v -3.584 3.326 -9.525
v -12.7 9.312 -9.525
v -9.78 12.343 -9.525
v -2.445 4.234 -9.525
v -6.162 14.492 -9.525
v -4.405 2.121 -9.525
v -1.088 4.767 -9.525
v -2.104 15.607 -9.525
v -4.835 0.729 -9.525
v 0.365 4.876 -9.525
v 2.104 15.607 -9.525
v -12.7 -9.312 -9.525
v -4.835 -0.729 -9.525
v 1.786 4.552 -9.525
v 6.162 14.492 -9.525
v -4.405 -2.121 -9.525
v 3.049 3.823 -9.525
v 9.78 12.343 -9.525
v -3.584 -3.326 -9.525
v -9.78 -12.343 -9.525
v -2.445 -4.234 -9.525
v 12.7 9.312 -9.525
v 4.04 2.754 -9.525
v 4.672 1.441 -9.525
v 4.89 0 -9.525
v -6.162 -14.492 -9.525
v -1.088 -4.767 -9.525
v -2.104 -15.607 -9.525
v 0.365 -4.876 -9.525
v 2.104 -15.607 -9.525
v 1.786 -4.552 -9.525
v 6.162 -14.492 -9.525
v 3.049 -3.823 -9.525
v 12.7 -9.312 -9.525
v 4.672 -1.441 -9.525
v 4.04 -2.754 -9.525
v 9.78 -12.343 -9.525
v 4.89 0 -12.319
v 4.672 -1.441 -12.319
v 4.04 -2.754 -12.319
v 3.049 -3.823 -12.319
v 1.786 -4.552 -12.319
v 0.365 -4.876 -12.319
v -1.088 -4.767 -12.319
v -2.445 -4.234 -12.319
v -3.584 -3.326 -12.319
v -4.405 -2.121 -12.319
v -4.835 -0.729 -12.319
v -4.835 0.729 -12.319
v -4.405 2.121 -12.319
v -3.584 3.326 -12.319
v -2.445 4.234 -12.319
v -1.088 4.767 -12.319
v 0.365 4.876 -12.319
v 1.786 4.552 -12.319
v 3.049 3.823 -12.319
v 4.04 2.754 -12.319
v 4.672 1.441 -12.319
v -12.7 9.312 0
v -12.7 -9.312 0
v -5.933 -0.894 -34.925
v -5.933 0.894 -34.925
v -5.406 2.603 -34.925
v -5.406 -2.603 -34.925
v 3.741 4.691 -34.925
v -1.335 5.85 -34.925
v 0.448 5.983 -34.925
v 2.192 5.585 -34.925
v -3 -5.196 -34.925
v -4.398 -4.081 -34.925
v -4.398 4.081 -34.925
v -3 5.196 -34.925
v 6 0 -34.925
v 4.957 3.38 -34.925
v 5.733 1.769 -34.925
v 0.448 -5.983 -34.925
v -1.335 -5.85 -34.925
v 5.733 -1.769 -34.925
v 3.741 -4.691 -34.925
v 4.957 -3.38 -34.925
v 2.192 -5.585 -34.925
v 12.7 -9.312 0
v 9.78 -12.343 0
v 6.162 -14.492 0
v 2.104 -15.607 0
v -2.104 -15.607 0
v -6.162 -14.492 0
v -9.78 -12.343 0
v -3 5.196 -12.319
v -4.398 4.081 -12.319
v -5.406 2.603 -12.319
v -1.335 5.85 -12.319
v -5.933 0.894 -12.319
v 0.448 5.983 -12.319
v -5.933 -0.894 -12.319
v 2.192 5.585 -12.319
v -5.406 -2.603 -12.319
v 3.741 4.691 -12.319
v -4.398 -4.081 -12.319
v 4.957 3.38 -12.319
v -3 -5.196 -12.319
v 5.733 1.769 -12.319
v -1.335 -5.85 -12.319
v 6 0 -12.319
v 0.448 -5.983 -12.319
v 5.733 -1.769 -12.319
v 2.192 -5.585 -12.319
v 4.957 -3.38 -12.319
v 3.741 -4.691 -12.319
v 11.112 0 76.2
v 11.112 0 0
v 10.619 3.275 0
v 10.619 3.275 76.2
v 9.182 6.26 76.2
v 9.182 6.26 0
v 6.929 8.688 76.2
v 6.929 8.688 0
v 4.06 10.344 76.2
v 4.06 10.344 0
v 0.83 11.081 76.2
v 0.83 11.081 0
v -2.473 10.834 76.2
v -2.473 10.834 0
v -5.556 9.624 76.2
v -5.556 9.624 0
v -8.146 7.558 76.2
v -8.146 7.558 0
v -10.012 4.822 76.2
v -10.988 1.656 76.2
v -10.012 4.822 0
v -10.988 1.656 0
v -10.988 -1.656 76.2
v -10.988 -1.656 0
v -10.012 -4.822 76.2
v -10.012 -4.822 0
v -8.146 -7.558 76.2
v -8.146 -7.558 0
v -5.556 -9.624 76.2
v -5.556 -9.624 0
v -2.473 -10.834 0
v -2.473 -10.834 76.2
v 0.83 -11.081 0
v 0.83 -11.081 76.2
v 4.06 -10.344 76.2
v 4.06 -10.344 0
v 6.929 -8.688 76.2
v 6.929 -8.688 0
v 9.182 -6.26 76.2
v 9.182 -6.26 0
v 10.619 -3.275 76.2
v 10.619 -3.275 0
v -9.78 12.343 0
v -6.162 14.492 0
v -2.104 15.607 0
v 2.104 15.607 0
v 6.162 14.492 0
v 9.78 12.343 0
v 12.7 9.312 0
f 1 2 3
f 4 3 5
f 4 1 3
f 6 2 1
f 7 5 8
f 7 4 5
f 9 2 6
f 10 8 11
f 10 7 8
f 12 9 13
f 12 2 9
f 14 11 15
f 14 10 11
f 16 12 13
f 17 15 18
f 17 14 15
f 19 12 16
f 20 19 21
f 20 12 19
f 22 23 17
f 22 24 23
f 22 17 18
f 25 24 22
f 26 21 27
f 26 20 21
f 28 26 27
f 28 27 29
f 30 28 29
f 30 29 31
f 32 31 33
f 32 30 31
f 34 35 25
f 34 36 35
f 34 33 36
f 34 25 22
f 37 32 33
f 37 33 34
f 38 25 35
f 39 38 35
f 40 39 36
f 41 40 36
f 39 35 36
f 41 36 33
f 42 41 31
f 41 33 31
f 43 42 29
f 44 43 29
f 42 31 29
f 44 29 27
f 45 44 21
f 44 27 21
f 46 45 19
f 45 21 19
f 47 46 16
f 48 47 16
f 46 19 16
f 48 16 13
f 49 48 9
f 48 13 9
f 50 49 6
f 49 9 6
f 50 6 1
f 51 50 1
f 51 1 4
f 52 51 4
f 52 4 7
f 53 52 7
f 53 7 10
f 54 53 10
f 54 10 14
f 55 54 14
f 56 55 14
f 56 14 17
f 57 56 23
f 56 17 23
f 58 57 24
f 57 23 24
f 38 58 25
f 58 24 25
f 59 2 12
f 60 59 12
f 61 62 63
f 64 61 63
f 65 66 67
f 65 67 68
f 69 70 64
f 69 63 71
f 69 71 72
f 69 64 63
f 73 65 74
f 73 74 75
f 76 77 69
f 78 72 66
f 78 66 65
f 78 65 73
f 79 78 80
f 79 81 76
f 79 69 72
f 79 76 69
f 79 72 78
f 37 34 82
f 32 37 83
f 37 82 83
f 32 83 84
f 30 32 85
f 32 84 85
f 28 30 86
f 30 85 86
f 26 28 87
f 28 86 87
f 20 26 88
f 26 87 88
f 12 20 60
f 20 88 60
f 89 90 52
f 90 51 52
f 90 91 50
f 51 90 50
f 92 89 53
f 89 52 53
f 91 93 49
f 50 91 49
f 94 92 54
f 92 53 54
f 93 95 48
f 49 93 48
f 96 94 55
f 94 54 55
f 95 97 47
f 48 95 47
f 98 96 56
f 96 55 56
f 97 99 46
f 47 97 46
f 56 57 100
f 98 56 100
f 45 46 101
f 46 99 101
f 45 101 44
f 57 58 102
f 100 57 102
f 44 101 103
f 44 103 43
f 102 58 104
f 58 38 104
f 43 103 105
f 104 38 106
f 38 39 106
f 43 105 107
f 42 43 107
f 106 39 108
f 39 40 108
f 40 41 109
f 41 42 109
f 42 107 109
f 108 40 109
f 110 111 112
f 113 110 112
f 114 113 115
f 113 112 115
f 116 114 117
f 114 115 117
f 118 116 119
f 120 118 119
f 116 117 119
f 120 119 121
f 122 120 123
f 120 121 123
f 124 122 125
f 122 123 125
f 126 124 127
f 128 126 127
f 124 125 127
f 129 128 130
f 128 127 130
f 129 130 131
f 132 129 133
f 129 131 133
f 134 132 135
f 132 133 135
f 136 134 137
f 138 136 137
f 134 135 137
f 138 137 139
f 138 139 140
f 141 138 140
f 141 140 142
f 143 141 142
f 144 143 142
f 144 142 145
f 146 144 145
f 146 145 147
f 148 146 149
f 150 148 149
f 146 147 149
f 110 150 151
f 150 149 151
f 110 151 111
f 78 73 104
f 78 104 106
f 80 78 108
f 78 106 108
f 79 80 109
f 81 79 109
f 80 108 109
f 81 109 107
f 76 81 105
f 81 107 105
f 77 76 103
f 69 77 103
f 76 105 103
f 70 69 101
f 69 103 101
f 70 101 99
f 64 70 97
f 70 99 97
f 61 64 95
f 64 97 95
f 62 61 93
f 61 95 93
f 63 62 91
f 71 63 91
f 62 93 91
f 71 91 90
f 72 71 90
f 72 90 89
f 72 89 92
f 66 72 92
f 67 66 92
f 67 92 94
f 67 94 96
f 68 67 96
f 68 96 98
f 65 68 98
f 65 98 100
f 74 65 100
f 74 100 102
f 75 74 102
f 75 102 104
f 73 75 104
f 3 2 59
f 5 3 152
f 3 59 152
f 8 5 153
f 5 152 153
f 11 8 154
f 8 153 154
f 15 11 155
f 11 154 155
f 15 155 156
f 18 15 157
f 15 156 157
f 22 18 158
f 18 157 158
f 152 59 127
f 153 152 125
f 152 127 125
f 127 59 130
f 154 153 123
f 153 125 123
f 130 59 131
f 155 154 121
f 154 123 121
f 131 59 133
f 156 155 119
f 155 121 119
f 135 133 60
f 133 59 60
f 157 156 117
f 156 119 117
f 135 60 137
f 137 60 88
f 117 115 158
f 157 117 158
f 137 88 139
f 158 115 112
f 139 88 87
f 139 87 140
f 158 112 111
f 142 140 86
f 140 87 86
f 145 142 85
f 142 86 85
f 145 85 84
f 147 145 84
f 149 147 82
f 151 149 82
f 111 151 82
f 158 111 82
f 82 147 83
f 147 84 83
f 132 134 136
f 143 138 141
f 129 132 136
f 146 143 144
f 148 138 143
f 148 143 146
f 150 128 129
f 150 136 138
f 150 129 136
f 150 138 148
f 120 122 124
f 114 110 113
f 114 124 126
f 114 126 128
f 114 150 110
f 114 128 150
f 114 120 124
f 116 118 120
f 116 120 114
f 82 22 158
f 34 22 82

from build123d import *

# Parameters (mm, degrees)
F0_R     = 11.1125
F1_DEPTH = 76.2
F2_R     = 15.748
F3_DEPTH = 9.525
F4_R     = 6
F5_DEPTH = 25.4
F6_R     = 6
F6_R_2   = 4.8895
F7_DEPTH = 2.794
F8_W     = 13.440132
F8_H     = 49.0506
F9_DEPTH = 85.726


with BuildPart() as f1:
    # F0 (on Top) → F1 (new body)
    with BuildSketch(Plane.XY):
        Circle(F0_R)
    extrude(amount=F1_DEPTH)

    # F2 (on face) → F3 (join)
    with BuildSketch(Plane(origin=(0, 0, 0), x_dir=(1, 0, 0), z_dir=(0, 0, -1))):
        Circle(F2_R)
    extrude(amount=F3_DEPTH)

    # F4 (on face) → F5 (join)
    with BuildSketch(Plane(origin=(0, 0, -9.525), x_dir=(1, 0, 0), z_dir=(0, 0, -1))):
        Circle(F4_R)
    extrude(amount=F5_DEPTH)

    # F6 (on face) → F7 (cut)
    with BuildSketch(Plane(origin=(0, 0, -9.525), x_dir=(1, 0, 0), z_dir=(0, 0, -1))):
        Circle(F6_R)
        Circle(F6_R_2, mode=Mode.SUBTRACT)
    extrude(amount=F7_DEPTH, mode=Mode.SUBTRACT)

    # F8 (on face) → F9 (cut, through all)
    with BuildSketch(Plane(origin=(0, 0, -9.525), x_dir=(1, 0, 0), z_dir=(0, 0, -1))):
        with Locations((-19.420066, 0)):
            Rectangle(F8_W, F8_H)
        with Locations((19.420066, 0)):
            Rectangle(F8_W, F8_H)
    extrude(amount=-F9_DEPTH, mode=Mode.SUBTRACT)


solid = f1.part
